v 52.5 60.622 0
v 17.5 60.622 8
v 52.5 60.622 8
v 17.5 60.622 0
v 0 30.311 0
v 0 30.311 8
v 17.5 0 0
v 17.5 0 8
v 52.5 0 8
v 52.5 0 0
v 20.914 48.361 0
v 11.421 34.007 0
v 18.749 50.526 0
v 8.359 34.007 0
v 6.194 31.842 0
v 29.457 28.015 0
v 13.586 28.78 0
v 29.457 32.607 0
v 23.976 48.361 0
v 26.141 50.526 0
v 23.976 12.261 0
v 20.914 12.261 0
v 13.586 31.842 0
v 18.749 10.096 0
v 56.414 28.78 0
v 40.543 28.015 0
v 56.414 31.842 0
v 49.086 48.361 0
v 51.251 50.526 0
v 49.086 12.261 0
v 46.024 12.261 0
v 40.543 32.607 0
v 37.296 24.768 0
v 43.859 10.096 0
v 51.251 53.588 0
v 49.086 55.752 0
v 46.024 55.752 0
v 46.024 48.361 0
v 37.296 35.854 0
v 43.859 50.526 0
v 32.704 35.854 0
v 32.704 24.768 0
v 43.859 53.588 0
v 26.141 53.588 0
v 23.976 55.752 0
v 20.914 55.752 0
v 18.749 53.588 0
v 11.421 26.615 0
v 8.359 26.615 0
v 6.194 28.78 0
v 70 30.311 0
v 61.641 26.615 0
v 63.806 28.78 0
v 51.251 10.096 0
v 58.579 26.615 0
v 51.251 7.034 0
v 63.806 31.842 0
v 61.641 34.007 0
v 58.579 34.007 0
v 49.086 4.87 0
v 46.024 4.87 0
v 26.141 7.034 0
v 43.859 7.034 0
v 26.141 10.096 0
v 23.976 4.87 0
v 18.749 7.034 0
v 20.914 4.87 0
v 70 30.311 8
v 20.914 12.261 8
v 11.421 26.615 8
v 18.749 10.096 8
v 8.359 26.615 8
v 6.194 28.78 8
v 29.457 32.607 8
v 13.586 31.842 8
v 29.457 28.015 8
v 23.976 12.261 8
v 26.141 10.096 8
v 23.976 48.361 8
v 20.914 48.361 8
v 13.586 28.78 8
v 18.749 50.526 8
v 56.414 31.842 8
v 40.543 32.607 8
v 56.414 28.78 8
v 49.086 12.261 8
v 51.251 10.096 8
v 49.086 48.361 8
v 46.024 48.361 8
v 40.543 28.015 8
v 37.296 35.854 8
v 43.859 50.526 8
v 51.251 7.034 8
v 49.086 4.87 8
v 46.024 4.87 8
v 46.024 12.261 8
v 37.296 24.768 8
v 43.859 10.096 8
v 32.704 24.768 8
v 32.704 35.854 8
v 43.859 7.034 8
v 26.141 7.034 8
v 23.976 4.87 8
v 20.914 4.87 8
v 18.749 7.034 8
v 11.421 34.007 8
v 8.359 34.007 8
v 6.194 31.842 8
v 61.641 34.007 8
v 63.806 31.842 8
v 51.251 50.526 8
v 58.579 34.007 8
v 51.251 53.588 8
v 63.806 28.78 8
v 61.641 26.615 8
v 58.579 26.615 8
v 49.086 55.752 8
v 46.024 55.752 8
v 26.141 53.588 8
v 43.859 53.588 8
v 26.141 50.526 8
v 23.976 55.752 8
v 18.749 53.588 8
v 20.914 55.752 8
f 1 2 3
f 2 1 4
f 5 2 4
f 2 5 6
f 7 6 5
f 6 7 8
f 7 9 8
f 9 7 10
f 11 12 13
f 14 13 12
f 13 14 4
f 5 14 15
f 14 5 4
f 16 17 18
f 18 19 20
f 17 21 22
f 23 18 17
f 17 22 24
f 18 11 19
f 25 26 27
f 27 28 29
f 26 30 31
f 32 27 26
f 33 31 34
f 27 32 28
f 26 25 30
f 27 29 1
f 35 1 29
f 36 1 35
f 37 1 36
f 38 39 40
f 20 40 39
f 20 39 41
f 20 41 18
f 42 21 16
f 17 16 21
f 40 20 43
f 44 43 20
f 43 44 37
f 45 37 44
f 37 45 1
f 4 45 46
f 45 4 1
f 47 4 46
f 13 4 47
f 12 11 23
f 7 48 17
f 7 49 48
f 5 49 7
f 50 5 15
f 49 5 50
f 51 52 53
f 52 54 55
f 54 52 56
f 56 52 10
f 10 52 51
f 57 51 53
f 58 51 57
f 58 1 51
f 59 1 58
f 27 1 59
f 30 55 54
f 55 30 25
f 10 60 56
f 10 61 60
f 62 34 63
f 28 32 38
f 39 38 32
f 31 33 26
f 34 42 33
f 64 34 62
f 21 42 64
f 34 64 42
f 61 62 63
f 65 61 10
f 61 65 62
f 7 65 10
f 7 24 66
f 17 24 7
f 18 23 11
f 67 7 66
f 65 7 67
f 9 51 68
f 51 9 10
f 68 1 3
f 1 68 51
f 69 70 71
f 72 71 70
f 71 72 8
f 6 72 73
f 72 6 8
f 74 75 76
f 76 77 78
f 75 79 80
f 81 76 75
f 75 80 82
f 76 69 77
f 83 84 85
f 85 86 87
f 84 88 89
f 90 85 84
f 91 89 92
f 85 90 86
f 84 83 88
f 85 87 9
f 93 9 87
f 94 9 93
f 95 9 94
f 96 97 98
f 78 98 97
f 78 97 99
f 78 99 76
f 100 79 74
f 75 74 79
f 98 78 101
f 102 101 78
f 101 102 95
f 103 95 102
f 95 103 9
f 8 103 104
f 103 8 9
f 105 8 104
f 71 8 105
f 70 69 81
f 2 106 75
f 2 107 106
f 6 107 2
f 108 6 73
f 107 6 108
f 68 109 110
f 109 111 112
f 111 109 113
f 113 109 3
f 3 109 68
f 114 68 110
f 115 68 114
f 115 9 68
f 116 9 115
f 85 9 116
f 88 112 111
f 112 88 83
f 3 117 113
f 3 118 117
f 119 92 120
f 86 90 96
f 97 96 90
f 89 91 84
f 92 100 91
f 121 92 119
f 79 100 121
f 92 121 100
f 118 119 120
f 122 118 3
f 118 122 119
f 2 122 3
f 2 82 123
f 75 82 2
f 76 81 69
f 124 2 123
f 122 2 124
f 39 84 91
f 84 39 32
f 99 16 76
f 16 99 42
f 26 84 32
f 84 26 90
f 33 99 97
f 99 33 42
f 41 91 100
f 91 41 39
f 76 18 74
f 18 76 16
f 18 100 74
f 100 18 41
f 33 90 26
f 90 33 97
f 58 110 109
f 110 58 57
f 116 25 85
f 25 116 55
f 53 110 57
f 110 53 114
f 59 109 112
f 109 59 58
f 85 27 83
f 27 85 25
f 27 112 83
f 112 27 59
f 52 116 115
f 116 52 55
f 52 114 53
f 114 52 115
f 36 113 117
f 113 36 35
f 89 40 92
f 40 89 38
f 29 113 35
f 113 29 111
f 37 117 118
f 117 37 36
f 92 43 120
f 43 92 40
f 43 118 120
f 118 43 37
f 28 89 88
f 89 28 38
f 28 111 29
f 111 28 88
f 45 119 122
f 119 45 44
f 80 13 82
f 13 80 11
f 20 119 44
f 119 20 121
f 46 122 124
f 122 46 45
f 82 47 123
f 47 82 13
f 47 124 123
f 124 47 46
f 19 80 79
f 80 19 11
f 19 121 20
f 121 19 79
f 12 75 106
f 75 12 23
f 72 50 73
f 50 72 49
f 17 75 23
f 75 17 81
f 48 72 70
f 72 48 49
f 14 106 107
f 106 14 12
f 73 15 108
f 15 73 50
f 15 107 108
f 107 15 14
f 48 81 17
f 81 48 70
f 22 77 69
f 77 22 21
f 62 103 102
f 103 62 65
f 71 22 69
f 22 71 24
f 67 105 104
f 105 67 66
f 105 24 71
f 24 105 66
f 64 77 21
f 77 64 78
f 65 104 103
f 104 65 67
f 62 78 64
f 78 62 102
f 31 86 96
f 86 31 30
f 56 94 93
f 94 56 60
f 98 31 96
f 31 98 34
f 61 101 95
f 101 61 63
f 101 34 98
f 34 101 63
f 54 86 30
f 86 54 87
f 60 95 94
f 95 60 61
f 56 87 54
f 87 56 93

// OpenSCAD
$fn = 32;

// ----------------------------------------------------------------------
// Polygon plate: 6-gon R35, 6 bolt windows
// ----------------------------------------------------------------------

// --- parameters (mm) ---
sides = 6;                // number of polygon sides
plate_r = 35;             // circumscribed radius of the polygon
bore_r = 6;               // centre bore radius
bolts = 6;                // number of bolt windows
ring_r = 25.11;           // bolt-circle radius
bolt_r = 4;               // bolt window radius
plate_t = 8;              // plate thickness, Z (extrusion height)

plate_d = 2 * plate_r;  // circumscribed diameter
bore_d = 2 * bore_r;  // centre bore diameter
bolt_d = 2 * bolt_r;  // bolt window diameter
ring_d = 2 * ring_r;  // bolt-circle diameter

profile = [[70, 30.311], [52.5, 60.622], [17.5, 60.622], [0, 30.311], [17.5, 0], [52.5, 0]];  // primary outline, 6 points, counter clockwise
void_1 = [[40.543, 32.607], [37.296, 35.854], [32.704, 35.854], [29.457, 32.607], [29.457, 28.015], [32.704, 24.768], [37.296, 24.768], [40.543, 28.015]];  // centre bore, 8 points
void_2 = [[63.806, 31.842], [61.641, 34.007], [58.579, 34.007], [56.414, 31.842], [56.414, 28.78], [58.579, 26.615], [61.641, 26.615], [63.806, 28.78]];  // bolt window 1, 8 points
void_3 = [[51.251, 53.588], [49.086, 55.752], [46.024, 55.752], [43.859, 53.588], [43.859, 50.526], [46.024, 48.361], [49.086, 48.361], [51.251, 50.526]];  // bolt window 2, 8 points
void_4 = [[26.141, 53.588], [23.976, 55.752], [20.914, 55.752], [18.749, 53.588], [18.749, 50.526], [20.914, 48.361], [23.976, 48.361], [26.141, 50.526]];  // bolt window 3, 8 points
void_5 = [[13.586, 31.842], [11.421, 34.007], [8.359, 34.007], [6.194, 31.842], [6.194, 28.78], [8.359, 26.615], [11.421, 26.615], [13.586, 28.78]];  // bolt window 4, 8 points
void_6 = [[26.141, 10.096], [23.976, 12.261], [20.914, 12.261], [18.749, 10.096], [18.749, 7.034], [20.914, 4.87], [23.976, 4.87], [26.141, 7.034]];  // bolt window 5, 8 points
void_7 = [[51.251, 10.096], [49.086, 12.261], [46.024, 12.261], [43.859, 10.096], [43.859, 7.034], [46.024, 4.87], [49.086, 4.87], [51.251, 7.034]];  // bolt window 6, 8 points

// --- the one profile operation ---
difference() {
  linear_extrude(height = plate_t) polygon(points = profile);
  translate([0, 0, -1])
    linear_extrude(height = plate_t + 2) polygon(points = void_1);
  translate([0, 0, -1])
    linear_extrude(height = plate_t + 2) polygon(points = void_2);
  translate([0, 0, -1])
    linear_extrude(height = plate_t + 2) polygon(points = void_3);
  translate([0, 0, -1])
    linear_extrude(height = plate_t + 2) polygon(points = void_4);
  translate([0, 0, -1])
    linear_extrude(height = plate_t + 2) polygon(points = void_5);
  translate([0, 0, -1])
    linear_extrude(height = plate_t + 2) polygon(points = void_6);
  translate([0, 0, -1])
    linear_extrude(height = plate_t + 2) polygon(points = void_7);
}
